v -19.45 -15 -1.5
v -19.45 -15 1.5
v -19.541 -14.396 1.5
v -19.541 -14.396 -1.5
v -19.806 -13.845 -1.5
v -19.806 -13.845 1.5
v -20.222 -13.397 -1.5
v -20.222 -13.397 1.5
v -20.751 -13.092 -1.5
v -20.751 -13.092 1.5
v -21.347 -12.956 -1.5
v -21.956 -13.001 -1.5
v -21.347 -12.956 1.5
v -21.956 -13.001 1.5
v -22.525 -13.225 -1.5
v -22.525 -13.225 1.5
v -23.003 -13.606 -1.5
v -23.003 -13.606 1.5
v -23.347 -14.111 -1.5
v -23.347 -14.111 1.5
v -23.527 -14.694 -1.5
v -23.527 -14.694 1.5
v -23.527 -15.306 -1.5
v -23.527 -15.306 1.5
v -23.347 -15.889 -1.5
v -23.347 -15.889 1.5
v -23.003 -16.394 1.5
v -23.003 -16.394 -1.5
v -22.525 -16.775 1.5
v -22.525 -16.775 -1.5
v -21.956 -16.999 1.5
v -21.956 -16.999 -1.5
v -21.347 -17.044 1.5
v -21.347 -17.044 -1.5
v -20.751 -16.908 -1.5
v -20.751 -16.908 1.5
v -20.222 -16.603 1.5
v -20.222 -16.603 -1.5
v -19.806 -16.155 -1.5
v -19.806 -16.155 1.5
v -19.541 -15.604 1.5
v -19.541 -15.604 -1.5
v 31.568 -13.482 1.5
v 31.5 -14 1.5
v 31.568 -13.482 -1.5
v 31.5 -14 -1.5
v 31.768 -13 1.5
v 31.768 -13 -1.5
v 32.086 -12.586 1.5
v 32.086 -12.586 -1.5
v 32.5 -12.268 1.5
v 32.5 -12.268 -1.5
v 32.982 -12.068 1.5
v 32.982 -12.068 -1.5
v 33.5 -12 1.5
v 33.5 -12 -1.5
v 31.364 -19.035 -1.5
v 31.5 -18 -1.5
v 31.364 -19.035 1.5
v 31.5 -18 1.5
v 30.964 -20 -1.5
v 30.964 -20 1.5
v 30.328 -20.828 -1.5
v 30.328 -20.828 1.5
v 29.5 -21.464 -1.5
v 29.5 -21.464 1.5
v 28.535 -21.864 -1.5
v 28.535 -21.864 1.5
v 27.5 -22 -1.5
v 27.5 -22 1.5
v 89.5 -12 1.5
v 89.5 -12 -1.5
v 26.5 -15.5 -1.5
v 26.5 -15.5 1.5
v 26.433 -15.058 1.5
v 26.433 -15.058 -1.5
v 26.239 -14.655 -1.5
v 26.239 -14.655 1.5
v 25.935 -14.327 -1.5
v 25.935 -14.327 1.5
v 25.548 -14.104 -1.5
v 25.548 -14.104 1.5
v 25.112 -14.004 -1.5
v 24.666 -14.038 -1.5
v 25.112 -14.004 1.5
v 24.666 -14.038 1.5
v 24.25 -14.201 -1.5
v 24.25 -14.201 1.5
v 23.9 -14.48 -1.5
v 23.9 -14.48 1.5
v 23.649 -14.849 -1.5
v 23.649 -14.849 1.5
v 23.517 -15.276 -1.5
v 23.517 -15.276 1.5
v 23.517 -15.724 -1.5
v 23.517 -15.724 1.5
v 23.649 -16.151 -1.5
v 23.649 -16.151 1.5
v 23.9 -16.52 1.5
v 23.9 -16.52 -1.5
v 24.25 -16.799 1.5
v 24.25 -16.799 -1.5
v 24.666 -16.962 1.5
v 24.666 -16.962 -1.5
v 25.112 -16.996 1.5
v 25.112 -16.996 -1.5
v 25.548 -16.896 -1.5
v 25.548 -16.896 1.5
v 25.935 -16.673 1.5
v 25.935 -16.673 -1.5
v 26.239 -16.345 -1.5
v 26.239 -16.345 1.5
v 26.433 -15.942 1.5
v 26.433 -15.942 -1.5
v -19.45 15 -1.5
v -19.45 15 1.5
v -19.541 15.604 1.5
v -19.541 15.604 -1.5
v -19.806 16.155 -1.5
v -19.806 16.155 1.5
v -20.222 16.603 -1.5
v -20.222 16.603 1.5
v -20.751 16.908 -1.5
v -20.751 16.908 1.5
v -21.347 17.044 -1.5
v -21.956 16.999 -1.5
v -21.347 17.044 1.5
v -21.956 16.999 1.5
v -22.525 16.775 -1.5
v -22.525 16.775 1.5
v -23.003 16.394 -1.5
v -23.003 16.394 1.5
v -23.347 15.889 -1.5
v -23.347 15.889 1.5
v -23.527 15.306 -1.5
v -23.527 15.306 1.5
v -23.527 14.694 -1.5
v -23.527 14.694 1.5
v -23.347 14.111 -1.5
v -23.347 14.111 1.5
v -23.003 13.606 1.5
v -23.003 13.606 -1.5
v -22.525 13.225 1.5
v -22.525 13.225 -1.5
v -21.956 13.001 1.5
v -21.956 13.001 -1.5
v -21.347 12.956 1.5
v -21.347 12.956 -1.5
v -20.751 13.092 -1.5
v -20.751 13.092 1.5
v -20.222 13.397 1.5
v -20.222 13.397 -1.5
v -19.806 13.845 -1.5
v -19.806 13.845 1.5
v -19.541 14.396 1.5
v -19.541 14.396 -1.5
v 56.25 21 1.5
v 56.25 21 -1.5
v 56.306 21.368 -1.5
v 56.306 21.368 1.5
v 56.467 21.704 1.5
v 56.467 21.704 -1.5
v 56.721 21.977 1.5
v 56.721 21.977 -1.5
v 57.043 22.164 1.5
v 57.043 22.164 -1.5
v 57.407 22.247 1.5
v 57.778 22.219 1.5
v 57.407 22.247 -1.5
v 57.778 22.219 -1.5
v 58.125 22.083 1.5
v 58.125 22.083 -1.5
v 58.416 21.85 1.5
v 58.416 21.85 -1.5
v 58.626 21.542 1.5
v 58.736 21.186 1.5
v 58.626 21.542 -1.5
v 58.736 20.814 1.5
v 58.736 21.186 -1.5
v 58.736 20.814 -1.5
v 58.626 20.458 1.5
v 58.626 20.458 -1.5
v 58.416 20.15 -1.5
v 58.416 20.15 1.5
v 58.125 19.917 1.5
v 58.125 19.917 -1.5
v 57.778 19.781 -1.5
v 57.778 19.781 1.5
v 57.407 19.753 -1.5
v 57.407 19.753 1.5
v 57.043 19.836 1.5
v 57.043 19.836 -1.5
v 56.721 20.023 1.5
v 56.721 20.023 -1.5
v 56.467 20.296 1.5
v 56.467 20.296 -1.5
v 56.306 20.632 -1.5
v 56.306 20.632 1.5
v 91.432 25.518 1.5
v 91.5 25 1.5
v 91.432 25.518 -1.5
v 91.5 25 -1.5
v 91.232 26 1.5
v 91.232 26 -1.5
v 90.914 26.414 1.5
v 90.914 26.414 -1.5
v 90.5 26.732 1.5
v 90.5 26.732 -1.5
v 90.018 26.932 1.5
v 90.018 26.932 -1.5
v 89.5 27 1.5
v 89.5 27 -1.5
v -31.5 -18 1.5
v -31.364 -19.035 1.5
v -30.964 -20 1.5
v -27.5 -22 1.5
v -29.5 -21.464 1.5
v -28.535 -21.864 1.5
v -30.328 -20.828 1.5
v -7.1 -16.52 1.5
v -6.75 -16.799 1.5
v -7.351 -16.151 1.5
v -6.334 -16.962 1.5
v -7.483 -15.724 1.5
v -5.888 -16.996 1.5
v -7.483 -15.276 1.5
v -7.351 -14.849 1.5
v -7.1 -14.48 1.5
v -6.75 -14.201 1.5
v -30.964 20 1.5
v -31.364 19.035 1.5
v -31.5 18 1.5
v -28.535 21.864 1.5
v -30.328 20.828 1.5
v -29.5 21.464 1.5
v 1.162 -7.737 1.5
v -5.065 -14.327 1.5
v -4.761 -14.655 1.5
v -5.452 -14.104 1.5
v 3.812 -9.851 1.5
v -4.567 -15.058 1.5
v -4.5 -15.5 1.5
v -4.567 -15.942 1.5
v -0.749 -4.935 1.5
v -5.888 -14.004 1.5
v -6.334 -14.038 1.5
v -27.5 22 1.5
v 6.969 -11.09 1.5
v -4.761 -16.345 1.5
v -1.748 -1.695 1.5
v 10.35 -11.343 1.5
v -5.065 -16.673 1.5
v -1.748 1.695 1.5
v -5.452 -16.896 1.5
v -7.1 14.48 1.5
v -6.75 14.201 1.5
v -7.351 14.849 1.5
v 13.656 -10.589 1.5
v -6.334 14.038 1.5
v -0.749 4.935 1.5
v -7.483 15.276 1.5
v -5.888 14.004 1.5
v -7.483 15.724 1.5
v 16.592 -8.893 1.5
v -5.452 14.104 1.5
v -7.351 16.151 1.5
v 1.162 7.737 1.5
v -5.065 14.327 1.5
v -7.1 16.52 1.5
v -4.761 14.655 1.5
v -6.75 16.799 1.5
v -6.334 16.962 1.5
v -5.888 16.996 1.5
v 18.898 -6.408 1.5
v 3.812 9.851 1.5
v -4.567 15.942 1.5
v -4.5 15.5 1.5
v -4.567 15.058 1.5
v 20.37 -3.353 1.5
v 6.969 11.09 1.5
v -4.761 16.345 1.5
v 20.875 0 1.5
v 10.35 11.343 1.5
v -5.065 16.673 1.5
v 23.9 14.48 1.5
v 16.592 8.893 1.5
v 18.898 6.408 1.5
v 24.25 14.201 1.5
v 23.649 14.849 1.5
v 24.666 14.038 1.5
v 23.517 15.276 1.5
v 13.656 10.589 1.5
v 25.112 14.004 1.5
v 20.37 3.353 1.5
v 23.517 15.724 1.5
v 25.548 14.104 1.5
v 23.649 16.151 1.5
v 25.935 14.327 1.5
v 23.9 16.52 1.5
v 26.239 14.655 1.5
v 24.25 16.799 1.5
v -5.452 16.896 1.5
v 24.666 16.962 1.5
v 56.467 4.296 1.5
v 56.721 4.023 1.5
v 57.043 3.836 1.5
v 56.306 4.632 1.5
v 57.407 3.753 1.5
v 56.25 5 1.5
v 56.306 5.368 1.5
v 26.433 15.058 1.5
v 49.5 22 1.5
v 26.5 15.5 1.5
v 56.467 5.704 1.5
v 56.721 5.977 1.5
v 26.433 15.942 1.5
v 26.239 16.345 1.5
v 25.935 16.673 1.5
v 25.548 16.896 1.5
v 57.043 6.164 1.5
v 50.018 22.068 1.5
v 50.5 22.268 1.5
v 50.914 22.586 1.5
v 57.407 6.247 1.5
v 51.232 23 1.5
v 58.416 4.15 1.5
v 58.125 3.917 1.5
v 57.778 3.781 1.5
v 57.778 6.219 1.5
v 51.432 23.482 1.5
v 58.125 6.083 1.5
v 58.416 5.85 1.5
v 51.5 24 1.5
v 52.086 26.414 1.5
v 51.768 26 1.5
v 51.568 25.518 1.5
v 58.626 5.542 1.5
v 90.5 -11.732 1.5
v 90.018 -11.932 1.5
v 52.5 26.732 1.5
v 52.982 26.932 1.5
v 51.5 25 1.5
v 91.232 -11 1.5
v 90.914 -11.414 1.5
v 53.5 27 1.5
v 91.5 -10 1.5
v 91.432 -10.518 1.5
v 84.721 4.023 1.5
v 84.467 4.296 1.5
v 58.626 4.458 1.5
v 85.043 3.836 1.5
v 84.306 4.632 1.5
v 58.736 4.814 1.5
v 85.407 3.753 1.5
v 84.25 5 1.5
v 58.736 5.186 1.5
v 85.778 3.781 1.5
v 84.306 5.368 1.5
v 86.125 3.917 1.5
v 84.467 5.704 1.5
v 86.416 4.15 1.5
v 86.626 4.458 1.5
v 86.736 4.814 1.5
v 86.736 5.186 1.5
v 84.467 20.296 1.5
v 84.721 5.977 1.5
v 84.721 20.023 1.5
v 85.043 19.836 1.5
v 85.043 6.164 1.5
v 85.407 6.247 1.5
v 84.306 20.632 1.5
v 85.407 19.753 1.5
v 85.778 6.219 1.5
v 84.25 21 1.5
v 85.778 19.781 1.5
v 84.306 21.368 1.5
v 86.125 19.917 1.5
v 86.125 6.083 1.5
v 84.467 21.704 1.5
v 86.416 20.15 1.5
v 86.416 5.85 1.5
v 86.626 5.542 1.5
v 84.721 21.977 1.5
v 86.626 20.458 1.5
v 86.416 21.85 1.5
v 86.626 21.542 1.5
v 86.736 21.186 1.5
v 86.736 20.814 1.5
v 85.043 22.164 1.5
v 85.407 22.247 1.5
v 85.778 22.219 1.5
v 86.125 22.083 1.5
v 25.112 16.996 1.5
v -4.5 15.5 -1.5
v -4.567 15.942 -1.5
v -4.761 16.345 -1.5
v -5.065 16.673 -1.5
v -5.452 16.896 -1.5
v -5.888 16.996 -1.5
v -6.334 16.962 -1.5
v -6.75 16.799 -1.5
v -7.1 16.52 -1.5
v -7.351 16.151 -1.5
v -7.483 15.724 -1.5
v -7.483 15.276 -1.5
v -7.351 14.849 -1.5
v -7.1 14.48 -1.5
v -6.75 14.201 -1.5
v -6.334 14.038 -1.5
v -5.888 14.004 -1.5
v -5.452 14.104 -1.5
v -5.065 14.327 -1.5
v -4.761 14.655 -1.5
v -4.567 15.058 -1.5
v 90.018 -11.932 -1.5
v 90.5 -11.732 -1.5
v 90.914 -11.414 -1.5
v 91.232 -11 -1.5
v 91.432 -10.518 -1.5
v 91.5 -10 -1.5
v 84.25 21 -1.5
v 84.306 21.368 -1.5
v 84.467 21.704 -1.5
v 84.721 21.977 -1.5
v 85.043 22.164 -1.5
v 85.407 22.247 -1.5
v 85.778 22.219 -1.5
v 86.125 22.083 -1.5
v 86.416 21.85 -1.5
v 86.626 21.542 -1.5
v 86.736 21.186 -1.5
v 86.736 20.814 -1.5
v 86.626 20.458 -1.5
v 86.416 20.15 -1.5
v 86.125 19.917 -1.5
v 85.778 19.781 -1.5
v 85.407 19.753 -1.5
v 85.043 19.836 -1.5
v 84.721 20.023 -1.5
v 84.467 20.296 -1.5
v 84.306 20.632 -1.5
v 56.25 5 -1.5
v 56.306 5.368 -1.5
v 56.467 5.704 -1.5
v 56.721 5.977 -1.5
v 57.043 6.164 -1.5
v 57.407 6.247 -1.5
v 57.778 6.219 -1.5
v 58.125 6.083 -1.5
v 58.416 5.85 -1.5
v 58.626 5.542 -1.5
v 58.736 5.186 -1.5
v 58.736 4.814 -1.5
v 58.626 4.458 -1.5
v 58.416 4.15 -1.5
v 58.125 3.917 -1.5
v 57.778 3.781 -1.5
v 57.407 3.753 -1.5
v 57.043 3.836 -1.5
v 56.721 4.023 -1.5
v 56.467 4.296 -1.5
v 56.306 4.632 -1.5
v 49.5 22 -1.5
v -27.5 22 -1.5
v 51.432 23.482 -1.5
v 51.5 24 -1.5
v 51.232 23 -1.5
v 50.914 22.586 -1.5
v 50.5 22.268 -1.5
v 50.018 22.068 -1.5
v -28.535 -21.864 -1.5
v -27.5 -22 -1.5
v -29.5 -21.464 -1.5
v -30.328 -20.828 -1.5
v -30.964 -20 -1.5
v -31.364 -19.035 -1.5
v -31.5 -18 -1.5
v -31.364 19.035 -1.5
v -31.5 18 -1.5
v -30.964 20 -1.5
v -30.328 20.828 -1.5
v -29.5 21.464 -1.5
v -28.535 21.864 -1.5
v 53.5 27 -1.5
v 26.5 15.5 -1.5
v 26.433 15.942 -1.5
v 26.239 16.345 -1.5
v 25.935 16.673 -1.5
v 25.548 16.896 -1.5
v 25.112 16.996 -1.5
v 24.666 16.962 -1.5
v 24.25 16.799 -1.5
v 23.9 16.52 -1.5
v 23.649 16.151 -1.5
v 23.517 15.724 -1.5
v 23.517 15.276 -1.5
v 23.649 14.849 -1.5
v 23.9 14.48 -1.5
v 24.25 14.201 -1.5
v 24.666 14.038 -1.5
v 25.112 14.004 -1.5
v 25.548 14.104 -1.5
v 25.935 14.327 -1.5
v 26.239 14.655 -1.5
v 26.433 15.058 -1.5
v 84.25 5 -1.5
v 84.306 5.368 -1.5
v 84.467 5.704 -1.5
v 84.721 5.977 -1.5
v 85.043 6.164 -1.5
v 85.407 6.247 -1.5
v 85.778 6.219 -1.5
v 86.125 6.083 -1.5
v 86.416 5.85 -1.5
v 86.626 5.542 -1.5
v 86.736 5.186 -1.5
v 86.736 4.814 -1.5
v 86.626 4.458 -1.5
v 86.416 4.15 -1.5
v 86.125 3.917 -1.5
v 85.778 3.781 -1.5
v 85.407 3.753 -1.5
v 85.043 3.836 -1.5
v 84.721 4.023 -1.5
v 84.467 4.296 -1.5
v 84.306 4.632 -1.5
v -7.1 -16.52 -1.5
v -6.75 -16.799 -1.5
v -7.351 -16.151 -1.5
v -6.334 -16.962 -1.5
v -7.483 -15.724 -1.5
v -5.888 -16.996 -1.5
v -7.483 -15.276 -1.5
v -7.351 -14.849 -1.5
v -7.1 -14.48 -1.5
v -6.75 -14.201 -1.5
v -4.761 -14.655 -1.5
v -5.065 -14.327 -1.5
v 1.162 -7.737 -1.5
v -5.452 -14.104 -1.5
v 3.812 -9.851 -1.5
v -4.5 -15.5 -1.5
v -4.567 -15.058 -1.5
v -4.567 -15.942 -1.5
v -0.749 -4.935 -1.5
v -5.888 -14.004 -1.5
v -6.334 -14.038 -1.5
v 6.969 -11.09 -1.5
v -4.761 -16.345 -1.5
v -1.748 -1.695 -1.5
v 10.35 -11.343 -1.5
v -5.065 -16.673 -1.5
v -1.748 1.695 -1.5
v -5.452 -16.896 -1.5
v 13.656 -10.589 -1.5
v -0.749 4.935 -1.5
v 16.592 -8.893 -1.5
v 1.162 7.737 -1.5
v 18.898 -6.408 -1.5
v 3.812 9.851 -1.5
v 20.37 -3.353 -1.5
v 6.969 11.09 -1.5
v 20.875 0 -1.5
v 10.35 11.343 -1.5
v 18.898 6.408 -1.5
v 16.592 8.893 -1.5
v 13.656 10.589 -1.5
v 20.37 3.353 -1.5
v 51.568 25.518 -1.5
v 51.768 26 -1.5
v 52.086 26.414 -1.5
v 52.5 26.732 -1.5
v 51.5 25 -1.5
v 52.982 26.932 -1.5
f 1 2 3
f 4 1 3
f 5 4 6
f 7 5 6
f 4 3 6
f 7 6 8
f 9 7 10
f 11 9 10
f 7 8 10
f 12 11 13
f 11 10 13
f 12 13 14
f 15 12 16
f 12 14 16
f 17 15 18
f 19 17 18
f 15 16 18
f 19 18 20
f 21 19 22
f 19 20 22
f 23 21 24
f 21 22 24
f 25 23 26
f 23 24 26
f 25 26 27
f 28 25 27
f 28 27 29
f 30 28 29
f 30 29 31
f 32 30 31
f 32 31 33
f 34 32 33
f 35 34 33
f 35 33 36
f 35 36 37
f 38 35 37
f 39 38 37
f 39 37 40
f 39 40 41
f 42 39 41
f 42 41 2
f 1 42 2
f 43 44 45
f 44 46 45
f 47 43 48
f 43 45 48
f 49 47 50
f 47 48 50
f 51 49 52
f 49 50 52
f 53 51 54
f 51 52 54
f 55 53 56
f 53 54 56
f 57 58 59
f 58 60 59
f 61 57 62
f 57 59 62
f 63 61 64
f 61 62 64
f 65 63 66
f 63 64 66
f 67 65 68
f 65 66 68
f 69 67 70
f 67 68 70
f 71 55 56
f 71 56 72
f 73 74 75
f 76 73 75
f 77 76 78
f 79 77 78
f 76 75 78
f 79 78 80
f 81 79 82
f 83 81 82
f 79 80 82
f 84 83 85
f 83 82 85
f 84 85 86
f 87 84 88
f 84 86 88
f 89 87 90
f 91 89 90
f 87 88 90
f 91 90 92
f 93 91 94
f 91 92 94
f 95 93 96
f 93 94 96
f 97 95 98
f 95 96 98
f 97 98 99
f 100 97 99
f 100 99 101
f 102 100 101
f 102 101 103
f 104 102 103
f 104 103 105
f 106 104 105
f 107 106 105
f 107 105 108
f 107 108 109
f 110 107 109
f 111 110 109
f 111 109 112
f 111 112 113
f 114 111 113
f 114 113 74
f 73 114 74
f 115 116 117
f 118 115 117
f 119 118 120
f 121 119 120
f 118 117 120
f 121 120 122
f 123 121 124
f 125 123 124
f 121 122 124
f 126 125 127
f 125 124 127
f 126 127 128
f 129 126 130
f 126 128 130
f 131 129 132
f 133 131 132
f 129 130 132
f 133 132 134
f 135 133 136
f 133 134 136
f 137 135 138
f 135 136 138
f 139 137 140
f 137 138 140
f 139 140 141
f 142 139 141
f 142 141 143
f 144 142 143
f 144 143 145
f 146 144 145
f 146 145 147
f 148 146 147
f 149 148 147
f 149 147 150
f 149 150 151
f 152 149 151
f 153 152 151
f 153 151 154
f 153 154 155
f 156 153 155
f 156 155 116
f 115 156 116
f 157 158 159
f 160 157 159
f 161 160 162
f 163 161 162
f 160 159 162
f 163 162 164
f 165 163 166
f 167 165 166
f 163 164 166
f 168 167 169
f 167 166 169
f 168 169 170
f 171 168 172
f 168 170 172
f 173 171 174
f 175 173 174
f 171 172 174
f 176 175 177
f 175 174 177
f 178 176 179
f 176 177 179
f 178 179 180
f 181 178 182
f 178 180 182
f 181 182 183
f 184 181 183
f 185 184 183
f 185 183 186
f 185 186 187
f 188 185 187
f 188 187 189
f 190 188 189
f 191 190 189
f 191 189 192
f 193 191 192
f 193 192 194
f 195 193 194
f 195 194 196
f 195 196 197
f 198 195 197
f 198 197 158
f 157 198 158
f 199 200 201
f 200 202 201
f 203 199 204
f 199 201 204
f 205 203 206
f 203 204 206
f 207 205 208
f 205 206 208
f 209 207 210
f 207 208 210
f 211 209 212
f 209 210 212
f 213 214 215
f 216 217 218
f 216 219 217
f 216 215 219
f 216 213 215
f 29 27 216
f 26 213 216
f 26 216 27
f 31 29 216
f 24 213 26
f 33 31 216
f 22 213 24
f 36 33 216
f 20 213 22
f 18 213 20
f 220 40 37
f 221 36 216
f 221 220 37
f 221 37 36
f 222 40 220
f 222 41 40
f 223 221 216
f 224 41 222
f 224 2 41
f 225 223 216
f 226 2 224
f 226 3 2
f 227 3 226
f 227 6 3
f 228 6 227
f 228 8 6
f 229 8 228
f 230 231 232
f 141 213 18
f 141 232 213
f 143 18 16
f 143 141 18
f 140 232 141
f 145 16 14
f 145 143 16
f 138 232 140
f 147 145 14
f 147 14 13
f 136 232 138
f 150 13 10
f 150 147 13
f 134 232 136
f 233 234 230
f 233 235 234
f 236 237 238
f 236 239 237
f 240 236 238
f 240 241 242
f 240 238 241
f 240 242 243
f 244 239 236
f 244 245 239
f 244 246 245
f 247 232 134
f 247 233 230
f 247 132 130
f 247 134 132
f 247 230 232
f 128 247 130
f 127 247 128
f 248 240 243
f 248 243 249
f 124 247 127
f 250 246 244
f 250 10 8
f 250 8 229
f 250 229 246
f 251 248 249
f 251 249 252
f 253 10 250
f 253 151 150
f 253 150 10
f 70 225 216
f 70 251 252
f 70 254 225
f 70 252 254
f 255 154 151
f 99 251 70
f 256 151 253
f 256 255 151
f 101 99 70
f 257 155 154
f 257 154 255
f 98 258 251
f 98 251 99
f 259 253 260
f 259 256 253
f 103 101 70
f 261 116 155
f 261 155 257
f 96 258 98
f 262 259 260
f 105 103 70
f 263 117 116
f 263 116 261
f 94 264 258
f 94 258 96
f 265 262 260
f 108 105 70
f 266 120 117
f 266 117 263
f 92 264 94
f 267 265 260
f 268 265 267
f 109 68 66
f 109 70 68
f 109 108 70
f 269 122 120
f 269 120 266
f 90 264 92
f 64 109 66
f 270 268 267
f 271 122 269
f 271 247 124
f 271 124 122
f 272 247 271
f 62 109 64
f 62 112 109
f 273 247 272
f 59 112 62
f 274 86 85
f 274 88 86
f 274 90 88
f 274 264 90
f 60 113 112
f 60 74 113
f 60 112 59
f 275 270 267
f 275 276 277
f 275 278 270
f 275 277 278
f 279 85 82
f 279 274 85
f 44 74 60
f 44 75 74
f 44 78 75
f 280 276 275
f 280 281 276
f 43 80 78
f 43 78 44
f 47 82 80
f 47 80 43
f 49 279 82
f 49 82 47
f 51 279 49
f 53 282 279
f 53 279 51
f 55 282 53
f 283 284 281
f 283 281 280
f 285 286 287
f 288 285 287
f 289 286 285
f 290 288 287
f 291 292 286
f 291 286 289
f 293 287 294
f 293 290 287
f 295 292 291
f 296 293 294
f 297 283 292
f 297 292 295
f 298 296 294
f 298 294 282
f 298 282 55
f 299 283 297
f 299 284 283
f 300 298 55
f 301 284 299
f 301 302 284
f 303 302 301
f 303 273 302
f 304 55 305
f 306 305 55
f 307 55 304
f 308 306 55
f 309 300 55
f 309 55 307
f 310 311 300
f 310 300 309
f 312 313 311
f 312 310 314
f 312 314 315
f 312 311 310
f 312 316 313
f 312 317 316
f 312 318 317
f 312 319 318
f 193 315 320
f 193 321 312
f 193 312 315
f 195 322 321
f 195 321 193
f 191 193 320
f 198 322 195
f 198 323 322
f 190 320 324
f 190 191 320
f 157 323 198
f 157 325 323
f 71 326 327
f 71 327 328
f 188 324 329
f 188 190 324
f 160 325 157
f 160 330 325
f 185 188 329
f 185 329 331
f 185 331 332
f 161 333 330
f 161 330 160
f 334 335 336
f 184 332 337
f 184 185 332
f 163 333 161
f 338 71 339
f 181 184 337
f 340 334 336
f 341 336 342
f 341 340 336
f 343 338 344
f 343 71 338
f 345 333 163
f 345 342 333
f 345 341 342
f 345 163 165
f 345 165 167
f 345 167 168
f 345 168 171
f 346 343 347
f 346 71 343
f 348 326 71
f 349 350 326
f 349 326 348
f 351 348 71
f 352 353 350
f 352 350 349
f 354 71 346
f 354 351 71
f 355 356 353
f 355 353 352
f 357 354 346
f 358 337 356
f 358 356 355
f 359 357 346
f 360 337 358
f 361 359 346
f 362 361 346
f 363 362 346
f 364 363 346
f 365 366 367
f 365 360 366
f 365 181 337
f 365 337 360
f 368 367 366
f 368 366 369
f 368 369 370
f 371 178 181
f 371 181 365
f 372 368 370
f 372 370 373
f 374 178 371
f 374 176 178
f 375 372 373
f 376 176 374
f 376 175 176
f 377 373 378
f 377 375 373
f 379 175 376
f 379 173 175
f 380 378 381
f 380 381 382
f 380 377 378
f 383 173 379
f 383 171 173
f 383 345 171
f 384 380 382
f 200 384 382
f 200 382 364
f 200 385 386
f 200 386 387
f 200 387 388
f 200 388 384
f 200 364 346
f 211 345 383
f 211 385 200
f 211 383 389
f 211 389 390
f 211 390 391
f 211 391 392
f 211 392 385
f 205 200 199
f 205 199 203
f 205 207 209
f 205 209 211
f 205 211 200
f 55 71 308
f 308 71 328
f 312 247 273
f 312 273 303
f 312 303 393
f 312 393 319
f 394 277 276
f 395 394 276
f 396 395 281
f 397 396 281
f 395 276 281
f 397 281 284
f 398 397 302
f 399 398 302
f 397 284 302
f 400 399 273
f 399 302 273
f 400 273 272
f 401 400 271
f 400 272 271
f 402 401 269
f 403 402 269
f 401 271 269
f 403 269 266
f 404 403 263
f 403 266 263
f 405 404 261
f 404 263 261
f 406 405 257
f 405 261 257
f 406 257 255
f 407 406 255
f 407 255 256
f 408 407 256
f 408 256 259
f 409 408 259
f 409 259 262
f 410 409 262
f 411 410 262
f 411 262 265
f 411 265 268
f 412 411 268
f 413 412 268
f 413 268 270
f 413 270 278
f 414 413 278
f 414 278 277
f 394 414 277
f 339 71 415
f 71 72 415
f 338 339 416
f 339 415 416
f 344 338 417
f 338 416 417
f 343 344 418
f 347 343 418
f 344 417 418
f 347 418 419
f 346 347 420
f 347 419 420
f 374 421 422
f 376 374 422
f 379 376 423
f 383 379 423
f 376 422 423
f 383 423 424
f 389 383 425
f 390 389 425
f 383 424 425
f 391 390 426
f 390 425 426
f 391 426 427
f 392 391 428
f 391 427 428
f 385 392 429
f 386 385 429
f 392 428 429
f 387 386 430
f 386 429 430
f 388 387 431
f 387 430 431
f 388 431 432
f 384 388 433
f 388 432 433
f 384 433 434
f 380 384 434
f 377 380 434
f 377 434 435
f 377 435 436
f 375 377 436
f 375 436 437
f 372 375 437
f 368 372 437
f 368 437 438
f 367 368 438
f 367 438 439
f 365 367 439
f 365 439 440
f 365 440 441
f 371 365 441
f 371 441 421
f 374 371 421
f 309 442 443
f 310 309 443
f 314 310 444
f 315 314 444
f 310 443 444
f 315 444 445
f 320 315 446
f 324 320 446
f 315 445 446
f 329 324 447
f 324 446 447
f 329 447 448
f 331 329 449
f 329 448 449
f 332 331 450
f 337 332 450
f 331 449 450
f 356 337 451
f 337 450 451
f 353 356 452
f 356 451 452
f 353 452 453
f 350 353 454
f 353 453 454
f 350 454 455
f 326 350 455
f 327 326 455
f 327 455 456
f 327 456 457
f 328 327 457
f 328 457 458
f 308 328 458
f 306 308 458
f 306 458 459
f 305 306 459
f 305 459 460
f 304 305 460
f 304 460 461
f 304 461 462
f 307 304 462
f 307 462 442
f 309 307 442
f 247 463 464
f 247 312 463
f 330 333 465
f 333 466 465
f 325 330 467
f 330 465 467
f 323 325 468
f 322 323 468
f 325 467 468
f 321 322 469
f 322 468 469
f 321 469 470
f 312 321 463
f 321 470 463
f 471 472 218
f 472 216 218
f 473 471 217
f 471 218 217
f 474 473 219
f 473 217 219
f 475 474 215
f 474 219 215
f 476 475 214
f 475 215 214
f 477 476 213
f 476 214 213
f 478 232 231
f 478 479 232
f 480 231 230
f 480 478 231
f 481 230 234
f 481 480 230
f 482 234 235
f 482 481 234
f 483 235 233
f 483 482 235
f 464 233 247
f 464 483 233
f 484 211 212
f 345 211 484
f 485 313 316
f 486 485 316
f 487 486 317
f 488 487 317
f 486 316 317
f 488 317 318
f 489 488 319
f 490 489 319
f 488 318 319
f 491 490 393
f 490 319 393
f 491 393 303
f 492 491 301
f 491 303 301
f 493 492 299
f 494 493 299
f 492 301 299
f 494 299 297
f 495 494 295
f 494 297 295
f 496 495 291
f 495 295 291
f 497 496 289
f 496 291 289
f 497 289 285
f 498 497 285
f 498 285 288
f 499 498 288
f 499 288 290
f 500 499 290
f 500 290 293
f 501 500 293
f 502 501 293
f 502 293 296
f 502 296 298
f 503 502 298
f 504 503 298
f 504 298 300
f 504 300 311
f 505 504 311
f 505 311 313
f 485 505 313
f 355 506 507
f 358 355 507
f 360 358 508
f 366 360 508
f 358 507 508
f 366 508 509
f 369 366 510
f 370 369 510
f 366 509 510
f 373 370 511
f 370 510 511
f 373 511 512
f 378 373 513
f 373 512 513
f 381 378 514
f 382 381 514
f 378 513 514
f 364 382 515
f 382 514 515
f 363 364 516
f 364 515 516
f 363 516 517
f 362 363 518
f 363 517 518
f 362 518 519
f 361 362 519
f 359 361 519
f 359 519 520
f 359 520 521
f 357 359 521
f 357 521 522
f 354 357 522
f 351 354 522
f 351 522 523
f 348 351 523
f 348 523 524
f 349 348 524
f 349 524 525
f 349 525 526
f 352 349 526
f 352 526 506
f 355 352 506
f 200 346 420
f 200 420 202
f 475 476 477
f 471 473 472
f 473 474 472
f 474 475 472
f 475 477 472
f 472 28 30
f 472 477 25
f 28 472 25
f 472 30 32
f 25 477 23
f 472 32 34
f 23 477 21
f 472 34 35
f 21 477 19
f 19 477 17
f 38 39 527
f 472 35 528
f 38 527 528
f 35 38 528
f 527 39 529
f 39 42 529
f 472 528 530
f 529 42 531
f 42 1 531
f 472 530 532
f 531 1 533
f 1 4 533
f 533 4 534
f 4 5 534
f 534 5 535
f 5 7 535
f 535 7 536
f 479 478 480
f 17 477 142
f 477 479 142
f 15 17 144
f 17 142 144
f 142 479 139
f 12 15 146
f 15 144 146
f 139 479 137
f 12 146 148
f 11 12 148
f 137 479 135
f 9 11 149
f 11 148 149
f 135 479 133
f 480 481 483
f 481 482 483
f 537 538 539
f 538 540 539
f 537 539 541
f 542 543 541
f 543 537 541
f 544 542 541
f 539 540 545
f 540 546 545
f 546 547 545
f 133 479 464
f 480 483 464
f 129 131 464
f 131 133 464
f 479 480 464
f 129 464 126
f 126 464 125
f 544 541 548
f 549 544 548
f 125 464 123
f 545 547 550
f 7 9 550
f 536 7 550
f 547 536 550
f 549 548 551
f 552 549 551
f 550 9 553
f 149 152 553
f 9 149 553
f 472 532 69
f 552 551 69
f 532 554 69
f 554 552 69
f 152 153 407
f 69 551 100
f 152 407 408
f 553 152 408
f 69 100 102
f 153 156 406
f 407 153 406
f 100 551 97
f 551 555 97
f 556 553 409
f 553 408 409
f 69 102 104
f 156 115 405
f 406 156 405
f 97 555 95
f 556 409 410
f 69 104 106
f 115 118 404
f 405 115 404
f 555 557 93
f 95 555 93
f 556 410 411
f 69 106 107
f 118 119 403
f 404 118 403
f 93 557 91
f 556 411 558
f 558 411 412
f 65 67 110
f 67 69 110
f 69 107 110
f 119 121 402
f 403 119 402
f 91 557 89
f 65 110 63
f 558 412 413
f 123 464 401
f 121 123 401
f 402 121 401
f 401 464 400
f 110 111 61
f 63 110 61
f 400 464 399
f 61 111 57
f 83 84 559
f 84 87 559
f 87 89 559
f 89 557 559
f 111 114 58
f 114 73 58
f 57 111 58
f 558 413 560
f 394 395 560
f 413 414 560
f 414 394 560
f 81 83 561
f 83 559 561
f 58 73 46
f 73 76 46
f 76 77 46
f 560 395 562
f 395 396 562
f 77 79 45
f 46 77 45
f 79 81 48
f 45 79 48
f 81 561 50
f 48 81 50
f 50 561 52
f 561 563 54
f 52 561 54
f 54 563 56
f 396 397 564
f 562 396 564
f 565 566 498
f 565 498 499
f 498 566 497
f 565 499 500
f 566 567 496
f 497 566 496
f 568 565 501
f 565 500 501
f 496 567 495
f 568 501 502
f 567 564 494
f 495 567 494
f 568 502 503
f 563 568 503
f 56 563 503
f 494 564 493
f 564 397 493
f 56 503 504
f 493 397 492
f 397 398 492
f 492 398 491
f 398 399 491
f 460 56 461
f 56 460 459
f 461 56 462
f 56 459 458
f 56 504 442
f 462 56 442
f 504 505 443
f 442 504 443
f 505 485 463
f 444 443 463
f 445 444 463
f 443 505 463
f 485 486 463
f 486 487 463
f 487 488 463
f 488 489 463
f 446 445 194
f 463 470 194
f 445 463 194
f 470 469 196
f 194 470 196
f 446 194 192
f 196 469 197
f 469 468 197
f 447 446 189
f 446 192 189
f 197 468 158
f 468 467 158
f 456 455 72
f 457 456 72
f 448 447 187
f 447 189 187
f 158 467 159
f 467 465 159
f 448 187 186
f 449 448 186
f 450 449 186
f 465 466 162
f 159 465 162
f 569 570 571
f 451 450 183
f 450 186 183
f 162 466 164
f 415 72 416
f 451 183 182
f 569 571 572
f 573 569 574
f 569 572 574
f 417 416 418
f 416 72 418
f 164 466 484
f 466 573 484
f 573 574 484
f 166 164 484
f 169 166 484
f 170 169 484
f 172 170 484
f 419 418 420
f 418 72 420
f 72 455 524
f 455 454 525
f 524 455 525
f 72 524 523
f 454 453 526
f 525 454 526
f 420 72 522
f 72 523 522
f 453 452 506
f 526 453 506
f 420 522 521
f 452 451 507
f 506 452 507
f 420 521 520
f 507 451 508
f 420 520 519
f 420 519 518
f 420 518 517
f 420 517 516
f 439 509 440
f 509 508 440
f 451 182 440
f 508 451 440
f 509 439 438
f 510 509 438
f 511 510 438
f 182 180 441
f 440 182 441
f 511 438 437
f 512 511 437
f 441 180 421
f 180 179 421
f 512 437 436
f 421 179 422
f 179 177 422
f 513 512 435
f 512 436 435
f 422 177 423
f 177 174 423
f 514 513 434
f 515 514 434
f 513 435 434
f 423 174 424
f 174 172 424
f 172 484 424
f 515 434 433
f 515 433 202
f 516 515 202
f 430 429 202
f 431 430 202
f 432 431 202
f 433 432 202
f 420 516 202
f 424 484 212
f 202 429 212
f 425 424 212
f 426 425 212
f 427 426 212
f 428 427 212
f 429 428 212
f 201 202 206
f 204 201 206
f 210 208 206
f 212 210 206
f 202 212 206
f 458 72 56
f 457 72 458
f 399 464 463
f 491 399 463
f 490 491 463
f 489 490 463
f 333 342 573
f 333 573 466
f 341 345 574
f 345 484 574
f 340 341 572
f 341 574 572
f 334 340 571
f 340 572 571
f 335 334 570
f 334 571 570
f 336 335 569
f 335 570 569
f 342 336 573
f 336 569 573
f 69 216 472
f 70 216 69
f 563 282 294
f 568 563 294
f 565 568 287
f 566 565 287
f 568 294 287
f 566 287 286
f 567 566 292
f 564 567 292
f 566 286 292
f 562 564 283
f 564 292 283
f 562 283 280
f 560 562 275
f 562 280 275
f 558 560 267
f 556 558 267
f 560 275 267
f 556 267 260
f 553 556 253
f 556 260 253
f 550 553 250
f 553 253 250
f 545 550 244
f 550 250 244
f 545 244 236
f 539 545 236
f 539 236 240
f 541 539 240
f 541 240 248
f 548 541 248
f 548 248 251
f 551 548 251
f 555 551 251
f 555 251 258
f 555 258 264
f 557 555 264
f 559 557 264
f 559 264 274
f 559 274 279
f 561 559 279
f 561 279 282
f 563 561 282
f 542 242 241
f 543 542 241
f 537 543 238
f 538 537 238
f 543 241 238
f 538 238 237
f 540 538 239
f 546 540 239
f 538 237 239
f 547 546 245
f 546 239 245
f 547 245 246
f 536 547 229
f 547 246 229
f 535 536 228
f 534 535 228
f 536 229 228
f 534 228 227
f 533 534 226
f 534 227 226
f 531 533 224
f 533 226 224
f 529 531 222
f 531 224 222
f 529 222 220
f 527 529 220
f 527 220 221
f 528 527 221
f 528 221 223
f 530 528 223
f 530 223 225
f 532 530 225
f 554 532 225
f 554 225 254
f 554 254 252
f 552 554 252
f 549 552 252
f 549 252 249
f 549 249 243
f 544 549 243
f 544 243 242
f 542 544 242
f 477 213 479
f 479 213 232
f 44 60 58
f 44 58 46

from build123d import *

# Parameters (mm, degrees)
SKETCH1_W                       = 63
SKETCH1_H                       = 44
BOSS_EXTRUDE1_DEPTH             = 1.5
BOSS_EXTRUDE2_DEPTH             = 3
SKETCH2_R                       = 11.375
SKETCH2_R_2                     = 1.5
SKETCH2_R_3                     = 2.05
CUT_EXTRUDE1_DEPTH              = 96.44762962
FILLET1_R                       = 4
TAP_DRILL_FOR_M3X0_5_TAP1_D     = 2.5
TAP_DRILL_FOR_M3X0_5_TAP1_DEPTH = 4
TAP_DRILL_FOR_M3X0_5_TAP1_TIP   = 0.751075774
FILLET2_R                       = 2


with BuildPart() as part:
    # Sketch1 → Boss-Extrude1 (new, symmetric)
    with BuildSketch(Plane.XY):
        Rectangle(SKETCH1_W, SKETCH1_H)
    extrude(amount=BOSS_EXTRUDE1_DEPTH, both=True)

    # Sketch3 → Boss-Extrude2 (add)
    with BuildSketch(Plane.XY.offset(1.5)):
        Polygon((31.5, -12), (91.5, -12), (91.5, 27), (51.5, 27), (51.5, 22), (31.5, 22), align=None)
    extrude(amount=-BOSS_EXTRUDE2_DEPTH)

    # Sketch2 → Cut-Extrude1 (cut, through all)
    with BuildSketch(Plane.XY.offset(1.5)):
        with Locations((9.5, 0)):
            Circle(SKETCH2_R)
        with Locations((-6, 15.5)):
            Circle(SKETCH2_R_2)
        with Locations((25, 15.5)):
            Circle(SKETCH2_R_2)
        with Locations((25, -15.5)):
            Circle(SKETCH2_R_2)
        with Locations((-6, -15.5)):
            Circle(SKETCH2_R_2)
        with Locations((-21.5, 15)):
            Circle(SKETCH2_R_3)
        with Locations((-21.5, -15)):
            Circle(SKETCH2_R_3)
    extrude(amount=-CUT_EXTRUDE1_DEPTH, mode=Mode.SUBTRACT)

    # Fillet1
    fillet1_edges = [part.edges().sort_by_distance(p)[0] for p in [
        (31.5, -22, 0),
        (-31.5, -22, 0),
        (-31.5, 22, 0),
    ]]
    fillet(fillet1_edges, radius=FILLET1_R)

    # Tap Drill for M3x0.5 Tap1
    with Locations(Plane.XY.offset(1.5)):
        with Locations((57.5, 21), (85.5, 21), (85.5, 5), (57.5, 5)):
            Hole(TAP_DRILL_FOR_M3X0_5_TAP1_D / 2, depth=TAP_DRILL_FOR_M3X0_5_TAP1_DEPTH)
            with Locations((0, 0, -(TAP_DRILL_FOR_M3X0_5_TAP1_DEPTH + TAP_DRILL_FOR_M3X0_5_TAP1_TIP / 2))):  # 118° drill point
                Cone(0, TAP_DRILL_FOR_M3X0_5_TAP1_D / 2, TAP_DRILL_FOR_M3X0_5_TAP1_TIP, mode=Mode.SUBTRACT)

    # Fillet2
    fillet2_edges = [part.edges().sort_by_distance(p)[0] for p in [
        (31.5, -12, 0),
        (51.5, 22, 0),
        (51.5, 27, 0),
        (91.5, 27, 0),
        (91.5, -12, 0),
    ]]
    fillet(fillet2_edges, radius=FILLET2_R)


solid = part.part
